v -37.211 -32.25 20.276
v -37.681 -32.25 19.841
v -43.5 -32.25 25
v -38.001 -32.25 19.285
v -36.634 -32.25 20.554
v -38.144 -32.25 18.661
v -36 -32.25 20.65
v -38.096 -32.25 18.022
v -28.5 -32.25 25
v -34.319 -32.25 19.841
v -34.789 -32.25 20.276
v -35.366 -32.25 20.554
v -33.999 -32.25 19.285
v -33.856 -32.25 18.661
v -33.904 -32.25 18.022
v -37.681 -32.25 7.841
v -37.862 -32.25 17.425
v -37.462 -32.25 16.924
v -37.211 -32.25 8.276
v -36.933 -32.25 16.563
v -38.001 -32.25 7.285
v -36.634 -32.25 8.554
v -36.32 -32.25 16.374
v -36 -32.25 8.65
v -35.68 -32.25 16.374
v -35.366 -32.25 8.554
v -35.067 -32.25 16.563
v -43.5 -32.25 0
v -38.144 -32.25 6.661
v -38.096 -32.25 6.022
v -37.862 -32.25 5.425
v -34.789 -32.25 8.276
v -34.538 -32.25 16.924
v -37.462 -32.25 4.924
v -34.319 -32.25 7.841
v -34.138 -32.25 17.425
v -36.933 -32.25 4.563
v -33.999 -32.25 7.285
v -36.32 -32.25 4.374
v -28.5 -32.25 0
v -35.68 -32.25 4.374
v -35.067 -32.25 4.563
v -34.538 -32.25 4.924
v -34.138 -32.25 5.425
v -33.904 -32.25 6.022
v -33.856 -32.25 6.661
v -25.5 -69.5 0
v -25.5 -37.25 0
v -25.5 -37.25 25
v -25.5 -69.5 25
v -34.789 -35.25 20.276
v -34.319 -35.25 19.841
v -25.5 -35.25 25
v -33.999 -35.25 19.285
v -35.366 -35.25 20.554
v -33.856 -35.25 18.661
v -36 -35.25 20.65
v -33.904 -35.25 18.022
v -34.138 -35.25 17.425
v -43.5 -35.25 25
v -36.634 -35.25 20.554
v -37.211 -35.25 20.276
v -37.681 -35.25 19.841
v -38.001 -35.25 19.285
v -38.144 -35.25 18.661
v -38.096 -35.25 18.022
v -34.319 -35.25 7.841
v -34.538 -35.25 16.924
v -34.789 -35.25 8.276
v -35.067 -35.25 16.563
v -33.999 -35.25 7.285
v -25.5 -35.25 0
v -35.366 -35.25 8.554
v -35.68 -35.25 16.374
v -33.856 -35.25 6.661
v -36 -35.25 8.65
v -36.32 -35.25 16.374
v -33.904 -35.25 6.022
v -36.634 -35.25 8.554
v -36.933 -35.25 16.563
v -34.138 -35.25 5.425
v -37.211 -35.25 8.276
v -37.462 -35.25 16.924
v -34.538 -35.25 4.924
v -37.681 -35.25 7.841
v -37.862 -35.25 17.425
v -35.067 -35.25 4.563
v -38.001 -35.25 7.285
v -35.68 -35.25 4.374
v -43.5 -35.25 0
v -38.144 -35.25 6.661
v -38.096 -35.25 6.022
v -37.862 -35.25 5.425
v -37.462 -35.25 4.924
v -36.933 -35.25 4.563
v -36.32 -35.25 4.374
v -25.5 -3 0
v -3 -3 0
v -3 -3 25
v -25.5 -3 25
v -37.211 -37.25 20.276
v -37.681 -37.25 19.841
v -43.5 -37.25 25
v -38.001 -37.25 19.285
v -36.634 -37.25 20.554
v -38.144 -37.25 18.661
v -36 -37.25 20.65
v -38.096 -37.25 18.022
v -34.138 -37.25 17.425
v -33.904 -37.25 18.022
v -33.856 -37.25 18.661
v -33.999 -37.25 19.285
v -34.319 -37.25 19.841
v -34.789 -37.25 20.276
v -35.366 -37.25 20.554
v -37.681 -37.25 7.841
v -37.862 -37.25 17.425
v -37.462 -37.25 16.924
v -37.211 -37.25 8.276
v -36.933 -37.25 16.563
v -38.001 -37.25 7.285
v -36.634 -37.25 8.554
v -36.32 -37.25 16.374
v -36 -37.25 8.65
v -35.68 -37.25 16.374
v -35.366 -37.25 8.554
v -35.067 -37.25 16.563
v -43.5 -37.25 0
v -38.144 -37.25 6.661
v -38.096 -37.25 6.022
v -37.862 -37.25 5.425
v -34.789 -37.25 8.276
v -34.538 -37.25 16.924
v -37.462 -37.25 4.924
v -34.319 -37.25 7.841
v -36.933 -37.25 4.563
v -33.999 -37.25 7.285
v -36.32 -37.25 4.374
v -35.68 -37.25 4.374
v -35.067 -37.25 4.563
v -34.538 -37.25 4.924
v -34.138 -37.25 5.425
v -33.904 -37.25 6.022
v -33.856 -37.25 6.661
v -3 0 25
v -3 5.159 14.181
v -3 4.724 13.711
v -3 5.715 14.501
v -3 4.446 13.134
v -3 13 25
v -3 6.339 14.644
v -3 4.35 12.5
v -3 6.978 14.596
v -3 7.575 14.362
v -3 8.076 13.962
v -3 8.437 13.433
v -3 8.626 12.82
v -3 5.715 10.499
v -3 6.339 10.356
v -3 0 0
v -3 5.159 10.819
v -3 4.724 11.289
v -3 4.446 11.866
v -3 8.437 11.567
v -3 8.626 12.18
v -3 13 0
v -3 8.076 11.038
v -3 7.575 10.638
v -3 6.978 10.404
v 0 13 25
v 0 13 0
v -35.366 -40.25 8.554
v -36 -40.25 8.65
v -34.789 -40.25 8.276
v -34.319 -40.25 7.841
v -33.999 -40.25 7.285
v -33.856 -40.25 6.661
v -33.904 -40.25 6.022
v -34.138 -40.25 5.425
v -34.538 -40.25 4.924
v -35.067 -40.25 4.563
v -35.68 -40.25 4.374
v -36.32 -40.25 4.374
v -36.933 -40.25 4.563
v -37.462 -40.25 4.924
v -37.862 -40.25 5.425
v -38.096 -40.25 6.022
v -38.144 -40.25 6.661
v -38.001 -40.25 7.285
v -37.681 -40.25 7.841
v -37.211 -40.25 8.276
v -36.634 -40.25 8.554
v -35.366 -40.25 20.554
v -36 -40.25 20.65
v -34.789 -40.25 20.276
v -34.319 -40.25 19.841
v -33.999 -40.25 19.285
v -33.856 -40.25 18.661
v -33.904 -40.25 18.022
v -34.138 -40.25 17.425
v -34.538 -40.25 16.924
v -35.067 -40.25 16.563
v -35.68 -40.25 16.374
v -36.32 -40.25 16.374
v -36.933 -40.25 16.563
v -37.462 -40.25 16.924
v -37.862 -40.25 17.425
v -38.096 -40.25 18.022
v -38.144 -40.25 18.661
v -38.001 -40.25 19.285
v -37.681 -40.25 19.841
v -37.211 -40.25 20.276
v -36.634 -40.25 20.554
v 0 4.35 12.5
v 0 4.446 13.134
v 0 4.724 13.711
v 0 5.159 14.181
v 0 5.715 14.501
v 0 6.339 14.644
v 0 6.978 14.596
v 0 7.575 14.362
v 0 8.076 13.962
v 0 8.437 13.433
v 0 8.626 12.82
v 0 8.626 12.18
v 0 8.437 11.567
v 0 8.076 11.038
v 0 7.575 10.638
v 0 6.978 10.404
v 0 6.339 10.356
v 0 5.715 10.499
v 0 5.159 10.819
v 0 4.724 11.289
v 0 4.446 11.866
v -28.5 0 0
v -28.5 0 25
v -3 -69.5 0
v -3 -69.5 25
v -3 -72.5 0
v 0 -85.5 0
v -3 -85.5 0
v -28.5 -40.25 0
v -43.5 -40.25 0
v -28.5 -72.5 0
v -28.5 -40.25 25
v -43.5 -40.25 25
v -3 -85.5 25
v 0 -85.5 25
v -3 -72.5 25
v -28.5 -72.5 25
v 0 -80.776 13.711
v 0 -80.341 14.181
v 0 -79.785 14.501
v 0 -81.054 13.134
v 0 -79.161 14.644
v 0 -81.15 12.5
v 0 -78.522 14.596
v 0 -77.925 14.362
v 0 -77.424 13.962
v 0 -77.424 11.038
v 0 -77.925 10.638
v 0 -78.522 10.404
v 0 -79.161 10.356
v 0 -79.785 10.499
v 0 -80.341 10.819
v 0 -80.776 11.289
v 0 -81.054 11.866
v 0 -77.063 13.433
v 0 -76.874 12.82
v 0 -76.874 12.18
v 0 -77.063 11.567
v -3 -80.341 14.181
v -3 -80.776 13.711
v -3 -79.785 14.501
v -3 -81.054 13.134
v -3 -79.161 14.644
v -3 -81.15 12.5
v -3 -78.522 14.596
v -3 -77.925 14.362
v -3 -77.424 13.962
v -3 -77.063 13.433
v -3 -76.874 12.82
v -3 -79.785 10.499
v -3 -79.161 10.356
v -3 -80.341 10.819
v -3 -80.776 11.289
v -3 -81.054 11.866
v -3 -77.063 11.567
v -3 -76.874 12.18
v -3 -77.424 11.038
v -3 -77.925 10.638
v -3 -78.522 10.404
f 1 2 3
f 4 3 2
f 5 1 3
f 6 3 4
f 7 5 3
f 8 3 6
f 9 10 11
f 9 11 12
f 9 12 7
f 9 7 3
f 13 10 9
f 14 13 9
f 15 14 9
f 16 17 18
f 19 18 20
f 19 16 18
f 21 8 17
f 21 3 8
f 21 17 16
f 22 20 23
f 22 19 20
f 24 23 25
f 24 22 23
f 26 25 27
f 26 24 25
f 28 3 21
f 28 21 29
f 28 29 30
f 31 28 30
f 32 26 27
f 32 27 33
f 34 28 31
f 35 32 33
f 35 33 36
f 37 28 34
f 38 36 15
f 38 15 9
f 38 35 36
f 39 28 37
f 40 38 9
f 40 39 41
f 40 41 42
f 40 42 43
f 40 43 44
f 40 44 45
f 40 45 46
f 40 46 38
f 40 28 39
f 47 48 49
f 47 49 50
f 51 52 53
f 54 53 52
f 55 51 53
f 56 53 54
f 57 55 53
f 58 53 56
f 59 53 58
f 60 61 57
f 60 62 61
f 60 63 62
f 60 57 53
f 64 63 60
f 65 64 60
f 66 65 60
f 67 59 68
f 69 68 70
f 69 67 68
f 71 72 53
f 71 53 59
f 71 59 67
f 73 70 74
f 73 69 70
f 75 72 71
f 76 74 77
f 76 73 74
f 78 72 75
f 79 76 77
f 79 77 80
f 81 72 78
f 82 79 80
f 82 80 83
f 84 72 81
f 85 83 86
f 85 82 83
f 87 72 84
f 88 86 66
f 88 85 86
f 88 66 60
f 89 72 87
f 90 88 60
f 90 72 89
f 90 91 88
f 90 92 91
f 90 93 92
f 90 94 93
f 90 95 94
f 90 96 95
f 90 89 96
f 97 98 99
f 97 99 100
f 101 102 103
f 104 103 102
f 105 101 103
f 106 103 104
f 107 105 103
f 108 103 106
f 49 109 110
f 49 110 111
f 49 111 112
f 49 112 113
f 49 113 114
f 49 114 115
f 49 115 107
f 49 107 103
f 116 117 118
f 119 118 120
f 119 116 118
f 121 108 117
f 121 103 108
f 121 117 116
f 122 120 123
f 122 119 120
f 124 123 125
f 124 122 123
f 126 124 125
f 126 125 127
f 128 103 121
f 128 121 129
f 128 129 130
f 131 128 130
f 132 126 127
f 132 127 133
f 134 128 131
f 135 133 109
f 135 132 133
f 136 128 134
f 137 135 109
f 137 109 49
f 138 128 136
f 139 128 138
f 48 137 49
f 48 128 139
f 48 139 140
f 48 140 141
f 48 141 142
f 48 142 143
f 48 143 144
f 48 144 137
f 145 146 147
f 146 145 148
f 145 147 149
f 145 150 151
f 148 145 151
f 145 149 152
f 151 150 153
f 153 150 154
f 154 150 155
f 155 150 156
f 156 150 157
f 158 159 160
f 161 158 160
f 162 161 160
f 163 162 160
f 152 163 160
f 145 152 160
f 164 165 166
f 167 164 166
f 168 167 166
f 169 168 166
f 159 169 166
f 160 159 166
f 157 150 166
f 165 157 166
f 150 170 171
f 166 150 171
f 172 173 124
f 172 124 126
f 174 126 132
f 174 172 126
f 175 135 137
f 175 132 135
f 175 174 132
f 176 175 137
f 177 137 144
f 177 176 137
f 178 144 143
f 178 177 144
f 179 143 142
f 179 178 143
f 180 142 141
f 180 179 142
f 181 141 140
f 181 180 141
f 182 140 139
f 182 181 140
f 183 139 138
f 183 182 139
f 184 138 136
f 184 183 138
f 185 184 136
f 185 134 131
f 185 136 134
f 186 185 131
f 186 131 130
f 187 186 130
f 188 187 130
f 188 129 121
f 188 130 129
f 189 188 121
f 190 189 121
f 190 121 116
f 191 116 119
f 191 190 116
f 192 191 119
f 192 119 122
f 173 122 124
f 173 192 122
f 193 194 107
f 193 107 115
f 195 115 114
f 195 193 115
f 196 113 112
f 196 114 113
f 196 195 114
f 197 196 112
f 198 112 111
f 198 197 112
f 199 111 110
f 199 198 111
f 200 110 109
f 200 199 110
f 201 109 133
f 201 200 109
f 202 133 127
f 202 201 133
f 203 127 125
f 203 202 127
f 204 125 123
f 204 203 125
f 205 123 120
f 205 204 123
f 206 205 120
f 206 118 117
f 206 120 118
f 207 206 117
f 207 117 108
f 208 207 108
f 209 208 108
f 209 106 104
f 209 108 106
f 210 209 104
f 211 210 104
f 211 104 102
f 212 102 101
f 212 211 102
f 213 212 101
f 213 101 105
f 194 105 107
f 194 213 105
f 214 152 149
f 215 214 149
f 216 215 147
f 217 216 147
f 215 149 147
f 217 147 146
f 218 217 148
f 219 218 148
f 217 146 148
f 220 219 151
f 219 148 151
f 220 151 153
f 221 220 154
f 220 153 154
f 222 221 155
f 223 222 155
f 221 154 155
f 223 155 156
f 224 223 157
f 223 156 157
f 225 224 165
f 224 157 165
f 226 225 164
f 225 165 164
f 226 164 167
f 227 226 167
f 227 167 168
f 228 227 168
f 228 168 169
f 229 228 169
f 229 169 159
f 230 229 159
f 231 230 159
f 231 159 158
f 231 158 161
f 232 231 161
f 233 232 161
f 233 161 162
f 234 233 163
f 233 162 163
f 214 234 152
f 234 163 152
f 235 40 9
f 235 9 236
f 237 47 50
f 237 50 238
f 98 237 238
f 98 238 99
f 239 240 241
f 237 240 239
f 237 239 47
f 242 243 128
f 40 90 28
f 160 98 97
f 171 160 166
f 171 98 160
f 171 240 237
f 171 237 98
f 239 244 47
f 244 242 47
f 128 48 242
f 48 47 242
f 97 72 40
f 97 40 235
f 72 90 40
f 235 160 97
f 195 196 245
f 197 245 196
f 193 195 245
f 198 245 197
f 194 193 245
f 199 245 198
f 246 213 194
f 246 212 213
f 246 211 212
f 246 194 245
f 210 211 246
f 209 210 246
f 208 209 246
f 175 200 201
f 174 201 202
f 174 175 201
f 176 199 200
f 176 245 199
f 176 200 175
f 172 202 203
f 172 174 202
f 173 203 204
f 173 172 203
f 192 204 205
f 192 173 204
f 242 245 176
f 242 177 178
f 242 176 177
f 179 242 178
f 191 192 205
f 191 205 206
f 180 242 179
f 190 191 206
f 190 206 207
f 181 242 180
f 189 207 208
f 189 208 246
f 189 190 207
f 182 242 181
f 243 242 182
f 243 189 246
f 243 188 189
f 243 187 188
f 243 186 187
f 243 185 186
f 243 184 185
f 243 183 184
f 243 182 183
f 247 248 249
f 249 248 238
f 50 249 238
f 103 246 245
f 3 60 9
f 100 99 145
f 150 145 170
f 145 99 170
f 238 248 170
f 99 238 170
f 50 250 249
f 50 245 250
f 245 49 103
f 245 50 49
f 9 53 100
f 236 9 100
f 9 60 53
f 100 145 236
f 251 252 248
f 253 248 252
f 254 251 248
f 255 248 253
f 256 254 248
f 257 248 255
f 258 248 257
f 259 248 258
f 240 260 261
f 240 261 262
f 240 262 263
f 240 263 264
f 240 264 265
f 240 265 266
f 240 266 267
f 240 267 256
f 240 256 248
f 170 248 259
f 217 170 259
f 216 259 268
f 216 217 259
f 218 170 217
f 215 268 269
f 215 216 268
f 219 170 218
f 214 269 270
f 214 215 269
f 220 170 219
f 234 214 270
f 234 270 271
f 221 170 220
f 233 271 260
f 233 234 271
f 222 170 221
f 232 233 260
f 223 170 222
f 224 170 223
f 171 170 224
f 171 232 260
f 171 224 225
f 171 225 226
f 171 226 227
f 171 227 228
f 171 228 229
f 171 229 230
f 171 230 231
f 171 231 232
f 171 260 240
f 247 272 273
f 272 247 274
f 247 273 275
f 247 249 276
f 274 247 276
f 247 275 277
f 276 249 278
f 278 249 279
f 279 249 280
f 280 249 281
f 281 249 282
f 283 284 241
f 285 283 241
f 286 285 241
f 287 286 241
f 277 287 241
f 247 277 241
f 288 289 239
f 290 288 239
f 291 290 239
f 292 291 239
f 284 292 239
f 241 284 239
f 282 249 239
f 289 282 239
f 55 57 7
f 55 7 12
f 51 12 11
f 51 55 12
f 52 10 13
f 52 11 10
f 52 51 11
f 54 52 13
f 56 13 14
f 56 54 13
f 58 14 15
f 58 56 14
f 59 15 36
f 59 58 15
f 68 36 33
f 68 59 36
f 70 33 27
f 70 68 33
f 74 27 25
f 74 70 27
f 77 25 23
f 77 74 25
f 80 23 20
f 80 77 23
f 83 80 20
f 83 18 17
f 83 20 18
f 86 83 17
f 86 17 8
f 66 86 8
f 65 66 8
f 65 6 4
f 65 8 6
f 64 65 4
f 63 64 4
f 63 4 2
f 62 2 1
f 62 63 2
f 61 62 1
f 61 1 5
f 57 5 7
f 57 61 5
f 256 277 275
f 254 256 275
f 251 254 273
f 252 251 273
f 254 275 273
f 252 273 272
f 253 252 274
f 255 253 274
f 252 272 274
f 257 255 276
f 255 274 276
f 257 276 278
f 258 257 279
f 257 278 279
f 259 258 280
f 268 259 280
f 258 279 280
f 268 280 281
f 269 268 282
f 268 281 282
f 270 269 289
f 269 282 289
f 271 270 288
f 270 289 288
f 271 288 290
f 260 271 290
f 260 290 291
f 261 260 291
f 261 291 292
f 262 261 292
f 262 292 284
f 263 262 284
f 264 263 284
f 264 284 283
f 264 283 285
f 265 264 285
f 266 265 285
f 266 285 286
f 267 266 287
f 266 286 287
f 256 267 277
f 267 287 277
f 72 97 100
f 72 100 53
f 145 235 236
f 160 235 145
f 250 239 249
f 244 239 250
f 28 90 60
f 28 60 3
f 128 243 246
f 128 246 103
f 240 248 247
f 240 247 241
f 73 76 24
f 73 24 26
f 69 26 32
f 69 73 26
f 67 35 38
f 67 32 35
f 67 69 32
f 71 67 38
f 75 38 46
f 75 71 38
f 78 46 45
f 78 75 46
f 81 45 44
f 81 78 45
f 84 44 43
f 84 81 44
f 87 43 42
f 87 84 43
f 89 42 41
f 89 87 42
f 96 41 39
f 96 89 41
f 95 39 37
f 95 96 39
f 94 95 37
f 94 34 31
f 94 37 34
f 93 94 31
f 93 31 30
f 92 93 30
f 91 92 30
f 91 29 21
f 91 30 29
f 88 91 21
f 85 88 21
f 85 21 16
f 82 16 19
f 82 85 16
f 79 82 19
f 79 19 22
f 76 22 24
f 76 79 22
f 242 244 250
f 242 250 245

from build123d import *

# Parameters (mm, degrees)
BOSS_EXTRUDE1_DEPTH     = 25
SKETCH3_W               = 25
SKETCH3_H               = 13
BOSS_EXTRUDE2_DEPTH     = 3
SKETCH4_R               = 2.15
CUT_EXTRUDE1_DEPTH      = 3
CUT_EXTRUDE2_DEPTH      = 74.16291752
CUT_EXTRUDE2_DEPTH_BACK = 74.16291752
SKETCH5_R               = 2.15


with BuildPart() as part:
    # Sketch2 → Boss-Extrude1 (new body)
    with BuildSketch(Plane.XY):
        Polygon((0, 0), (0, -72.5), (-28.5, -72.5), (-28.5, -40.25), (-43.5, -40.25), (-43.5, -37.25), (-25.5, -37.25), (-25.5, -69.5), (-3, -69.5), (-3, -3), (-25.5, -3), (-25.5, -35.25), (-43.5, -35.25), (-43.5, -32.25), (-28.5, -32.25), (-28.5, 0), align=None)
    extrude(amount=BOSS_EXTRUDE1_DEPTH)

    # Sketch3 → Boss-Extrude2 (add)
    with BuildSketch(Plane(origin=(0, 0, 0), x_dir=(0, 0, -1), z_dir=(1, 0, 0))):
        with Locations((-12.5, 6.5)):
            Rectangle(SKETCH3_W, SKETCH3_H)
        with Locations((-12.5, -79)):
            Rectangle(SKETCH3_W, SKETCH3_H)
    extrude(amount=-BOSS_EXTRUDE2_DEPTH)

    # Sketch4 → Cut-Extrude1 (cut)
    with BuildSketch(Plane.ZY.offset(3)):
        with Locations(Location((12.5, 6.5, 0), (0, 0, 270))):
            Circle(SKETCH4_R)
        with Locations(Location((12.5, -79, 0), (0, 0, 270))):
            Circle(SKETCH4_R)
    extrude(amount=-CUT_EXTRUDE1_DEPTH, mode=Mode.SUBTRACT)

    # Sketch5 → Cut-Extrude2 (cut, two sides: drawn at the far end of the back side and taken through both)
    with BuildSketch(Plane(origin=(0, -32.25, 0), x_dir=(1, 0, 0), z_dir=(0, 1, 0)).offset(-CUT_EXTRUDE2_DEPTH_BACK)):
        with Locations(Location((-36, -6.5, 0), (0, 0, 270))):
            Circle(SKETCH5_R)
        with Locations(Location((-36, -18.5, 0), (0, 0, 270))):
            Circle(SKETCH5_R)
    extrude(amount=CUT_EXTRUDE2_DEPTH + CUT_EXTRUDE2_DEPTH_BACK, mode=Mode.SUBTRACT)


solid = part.part
